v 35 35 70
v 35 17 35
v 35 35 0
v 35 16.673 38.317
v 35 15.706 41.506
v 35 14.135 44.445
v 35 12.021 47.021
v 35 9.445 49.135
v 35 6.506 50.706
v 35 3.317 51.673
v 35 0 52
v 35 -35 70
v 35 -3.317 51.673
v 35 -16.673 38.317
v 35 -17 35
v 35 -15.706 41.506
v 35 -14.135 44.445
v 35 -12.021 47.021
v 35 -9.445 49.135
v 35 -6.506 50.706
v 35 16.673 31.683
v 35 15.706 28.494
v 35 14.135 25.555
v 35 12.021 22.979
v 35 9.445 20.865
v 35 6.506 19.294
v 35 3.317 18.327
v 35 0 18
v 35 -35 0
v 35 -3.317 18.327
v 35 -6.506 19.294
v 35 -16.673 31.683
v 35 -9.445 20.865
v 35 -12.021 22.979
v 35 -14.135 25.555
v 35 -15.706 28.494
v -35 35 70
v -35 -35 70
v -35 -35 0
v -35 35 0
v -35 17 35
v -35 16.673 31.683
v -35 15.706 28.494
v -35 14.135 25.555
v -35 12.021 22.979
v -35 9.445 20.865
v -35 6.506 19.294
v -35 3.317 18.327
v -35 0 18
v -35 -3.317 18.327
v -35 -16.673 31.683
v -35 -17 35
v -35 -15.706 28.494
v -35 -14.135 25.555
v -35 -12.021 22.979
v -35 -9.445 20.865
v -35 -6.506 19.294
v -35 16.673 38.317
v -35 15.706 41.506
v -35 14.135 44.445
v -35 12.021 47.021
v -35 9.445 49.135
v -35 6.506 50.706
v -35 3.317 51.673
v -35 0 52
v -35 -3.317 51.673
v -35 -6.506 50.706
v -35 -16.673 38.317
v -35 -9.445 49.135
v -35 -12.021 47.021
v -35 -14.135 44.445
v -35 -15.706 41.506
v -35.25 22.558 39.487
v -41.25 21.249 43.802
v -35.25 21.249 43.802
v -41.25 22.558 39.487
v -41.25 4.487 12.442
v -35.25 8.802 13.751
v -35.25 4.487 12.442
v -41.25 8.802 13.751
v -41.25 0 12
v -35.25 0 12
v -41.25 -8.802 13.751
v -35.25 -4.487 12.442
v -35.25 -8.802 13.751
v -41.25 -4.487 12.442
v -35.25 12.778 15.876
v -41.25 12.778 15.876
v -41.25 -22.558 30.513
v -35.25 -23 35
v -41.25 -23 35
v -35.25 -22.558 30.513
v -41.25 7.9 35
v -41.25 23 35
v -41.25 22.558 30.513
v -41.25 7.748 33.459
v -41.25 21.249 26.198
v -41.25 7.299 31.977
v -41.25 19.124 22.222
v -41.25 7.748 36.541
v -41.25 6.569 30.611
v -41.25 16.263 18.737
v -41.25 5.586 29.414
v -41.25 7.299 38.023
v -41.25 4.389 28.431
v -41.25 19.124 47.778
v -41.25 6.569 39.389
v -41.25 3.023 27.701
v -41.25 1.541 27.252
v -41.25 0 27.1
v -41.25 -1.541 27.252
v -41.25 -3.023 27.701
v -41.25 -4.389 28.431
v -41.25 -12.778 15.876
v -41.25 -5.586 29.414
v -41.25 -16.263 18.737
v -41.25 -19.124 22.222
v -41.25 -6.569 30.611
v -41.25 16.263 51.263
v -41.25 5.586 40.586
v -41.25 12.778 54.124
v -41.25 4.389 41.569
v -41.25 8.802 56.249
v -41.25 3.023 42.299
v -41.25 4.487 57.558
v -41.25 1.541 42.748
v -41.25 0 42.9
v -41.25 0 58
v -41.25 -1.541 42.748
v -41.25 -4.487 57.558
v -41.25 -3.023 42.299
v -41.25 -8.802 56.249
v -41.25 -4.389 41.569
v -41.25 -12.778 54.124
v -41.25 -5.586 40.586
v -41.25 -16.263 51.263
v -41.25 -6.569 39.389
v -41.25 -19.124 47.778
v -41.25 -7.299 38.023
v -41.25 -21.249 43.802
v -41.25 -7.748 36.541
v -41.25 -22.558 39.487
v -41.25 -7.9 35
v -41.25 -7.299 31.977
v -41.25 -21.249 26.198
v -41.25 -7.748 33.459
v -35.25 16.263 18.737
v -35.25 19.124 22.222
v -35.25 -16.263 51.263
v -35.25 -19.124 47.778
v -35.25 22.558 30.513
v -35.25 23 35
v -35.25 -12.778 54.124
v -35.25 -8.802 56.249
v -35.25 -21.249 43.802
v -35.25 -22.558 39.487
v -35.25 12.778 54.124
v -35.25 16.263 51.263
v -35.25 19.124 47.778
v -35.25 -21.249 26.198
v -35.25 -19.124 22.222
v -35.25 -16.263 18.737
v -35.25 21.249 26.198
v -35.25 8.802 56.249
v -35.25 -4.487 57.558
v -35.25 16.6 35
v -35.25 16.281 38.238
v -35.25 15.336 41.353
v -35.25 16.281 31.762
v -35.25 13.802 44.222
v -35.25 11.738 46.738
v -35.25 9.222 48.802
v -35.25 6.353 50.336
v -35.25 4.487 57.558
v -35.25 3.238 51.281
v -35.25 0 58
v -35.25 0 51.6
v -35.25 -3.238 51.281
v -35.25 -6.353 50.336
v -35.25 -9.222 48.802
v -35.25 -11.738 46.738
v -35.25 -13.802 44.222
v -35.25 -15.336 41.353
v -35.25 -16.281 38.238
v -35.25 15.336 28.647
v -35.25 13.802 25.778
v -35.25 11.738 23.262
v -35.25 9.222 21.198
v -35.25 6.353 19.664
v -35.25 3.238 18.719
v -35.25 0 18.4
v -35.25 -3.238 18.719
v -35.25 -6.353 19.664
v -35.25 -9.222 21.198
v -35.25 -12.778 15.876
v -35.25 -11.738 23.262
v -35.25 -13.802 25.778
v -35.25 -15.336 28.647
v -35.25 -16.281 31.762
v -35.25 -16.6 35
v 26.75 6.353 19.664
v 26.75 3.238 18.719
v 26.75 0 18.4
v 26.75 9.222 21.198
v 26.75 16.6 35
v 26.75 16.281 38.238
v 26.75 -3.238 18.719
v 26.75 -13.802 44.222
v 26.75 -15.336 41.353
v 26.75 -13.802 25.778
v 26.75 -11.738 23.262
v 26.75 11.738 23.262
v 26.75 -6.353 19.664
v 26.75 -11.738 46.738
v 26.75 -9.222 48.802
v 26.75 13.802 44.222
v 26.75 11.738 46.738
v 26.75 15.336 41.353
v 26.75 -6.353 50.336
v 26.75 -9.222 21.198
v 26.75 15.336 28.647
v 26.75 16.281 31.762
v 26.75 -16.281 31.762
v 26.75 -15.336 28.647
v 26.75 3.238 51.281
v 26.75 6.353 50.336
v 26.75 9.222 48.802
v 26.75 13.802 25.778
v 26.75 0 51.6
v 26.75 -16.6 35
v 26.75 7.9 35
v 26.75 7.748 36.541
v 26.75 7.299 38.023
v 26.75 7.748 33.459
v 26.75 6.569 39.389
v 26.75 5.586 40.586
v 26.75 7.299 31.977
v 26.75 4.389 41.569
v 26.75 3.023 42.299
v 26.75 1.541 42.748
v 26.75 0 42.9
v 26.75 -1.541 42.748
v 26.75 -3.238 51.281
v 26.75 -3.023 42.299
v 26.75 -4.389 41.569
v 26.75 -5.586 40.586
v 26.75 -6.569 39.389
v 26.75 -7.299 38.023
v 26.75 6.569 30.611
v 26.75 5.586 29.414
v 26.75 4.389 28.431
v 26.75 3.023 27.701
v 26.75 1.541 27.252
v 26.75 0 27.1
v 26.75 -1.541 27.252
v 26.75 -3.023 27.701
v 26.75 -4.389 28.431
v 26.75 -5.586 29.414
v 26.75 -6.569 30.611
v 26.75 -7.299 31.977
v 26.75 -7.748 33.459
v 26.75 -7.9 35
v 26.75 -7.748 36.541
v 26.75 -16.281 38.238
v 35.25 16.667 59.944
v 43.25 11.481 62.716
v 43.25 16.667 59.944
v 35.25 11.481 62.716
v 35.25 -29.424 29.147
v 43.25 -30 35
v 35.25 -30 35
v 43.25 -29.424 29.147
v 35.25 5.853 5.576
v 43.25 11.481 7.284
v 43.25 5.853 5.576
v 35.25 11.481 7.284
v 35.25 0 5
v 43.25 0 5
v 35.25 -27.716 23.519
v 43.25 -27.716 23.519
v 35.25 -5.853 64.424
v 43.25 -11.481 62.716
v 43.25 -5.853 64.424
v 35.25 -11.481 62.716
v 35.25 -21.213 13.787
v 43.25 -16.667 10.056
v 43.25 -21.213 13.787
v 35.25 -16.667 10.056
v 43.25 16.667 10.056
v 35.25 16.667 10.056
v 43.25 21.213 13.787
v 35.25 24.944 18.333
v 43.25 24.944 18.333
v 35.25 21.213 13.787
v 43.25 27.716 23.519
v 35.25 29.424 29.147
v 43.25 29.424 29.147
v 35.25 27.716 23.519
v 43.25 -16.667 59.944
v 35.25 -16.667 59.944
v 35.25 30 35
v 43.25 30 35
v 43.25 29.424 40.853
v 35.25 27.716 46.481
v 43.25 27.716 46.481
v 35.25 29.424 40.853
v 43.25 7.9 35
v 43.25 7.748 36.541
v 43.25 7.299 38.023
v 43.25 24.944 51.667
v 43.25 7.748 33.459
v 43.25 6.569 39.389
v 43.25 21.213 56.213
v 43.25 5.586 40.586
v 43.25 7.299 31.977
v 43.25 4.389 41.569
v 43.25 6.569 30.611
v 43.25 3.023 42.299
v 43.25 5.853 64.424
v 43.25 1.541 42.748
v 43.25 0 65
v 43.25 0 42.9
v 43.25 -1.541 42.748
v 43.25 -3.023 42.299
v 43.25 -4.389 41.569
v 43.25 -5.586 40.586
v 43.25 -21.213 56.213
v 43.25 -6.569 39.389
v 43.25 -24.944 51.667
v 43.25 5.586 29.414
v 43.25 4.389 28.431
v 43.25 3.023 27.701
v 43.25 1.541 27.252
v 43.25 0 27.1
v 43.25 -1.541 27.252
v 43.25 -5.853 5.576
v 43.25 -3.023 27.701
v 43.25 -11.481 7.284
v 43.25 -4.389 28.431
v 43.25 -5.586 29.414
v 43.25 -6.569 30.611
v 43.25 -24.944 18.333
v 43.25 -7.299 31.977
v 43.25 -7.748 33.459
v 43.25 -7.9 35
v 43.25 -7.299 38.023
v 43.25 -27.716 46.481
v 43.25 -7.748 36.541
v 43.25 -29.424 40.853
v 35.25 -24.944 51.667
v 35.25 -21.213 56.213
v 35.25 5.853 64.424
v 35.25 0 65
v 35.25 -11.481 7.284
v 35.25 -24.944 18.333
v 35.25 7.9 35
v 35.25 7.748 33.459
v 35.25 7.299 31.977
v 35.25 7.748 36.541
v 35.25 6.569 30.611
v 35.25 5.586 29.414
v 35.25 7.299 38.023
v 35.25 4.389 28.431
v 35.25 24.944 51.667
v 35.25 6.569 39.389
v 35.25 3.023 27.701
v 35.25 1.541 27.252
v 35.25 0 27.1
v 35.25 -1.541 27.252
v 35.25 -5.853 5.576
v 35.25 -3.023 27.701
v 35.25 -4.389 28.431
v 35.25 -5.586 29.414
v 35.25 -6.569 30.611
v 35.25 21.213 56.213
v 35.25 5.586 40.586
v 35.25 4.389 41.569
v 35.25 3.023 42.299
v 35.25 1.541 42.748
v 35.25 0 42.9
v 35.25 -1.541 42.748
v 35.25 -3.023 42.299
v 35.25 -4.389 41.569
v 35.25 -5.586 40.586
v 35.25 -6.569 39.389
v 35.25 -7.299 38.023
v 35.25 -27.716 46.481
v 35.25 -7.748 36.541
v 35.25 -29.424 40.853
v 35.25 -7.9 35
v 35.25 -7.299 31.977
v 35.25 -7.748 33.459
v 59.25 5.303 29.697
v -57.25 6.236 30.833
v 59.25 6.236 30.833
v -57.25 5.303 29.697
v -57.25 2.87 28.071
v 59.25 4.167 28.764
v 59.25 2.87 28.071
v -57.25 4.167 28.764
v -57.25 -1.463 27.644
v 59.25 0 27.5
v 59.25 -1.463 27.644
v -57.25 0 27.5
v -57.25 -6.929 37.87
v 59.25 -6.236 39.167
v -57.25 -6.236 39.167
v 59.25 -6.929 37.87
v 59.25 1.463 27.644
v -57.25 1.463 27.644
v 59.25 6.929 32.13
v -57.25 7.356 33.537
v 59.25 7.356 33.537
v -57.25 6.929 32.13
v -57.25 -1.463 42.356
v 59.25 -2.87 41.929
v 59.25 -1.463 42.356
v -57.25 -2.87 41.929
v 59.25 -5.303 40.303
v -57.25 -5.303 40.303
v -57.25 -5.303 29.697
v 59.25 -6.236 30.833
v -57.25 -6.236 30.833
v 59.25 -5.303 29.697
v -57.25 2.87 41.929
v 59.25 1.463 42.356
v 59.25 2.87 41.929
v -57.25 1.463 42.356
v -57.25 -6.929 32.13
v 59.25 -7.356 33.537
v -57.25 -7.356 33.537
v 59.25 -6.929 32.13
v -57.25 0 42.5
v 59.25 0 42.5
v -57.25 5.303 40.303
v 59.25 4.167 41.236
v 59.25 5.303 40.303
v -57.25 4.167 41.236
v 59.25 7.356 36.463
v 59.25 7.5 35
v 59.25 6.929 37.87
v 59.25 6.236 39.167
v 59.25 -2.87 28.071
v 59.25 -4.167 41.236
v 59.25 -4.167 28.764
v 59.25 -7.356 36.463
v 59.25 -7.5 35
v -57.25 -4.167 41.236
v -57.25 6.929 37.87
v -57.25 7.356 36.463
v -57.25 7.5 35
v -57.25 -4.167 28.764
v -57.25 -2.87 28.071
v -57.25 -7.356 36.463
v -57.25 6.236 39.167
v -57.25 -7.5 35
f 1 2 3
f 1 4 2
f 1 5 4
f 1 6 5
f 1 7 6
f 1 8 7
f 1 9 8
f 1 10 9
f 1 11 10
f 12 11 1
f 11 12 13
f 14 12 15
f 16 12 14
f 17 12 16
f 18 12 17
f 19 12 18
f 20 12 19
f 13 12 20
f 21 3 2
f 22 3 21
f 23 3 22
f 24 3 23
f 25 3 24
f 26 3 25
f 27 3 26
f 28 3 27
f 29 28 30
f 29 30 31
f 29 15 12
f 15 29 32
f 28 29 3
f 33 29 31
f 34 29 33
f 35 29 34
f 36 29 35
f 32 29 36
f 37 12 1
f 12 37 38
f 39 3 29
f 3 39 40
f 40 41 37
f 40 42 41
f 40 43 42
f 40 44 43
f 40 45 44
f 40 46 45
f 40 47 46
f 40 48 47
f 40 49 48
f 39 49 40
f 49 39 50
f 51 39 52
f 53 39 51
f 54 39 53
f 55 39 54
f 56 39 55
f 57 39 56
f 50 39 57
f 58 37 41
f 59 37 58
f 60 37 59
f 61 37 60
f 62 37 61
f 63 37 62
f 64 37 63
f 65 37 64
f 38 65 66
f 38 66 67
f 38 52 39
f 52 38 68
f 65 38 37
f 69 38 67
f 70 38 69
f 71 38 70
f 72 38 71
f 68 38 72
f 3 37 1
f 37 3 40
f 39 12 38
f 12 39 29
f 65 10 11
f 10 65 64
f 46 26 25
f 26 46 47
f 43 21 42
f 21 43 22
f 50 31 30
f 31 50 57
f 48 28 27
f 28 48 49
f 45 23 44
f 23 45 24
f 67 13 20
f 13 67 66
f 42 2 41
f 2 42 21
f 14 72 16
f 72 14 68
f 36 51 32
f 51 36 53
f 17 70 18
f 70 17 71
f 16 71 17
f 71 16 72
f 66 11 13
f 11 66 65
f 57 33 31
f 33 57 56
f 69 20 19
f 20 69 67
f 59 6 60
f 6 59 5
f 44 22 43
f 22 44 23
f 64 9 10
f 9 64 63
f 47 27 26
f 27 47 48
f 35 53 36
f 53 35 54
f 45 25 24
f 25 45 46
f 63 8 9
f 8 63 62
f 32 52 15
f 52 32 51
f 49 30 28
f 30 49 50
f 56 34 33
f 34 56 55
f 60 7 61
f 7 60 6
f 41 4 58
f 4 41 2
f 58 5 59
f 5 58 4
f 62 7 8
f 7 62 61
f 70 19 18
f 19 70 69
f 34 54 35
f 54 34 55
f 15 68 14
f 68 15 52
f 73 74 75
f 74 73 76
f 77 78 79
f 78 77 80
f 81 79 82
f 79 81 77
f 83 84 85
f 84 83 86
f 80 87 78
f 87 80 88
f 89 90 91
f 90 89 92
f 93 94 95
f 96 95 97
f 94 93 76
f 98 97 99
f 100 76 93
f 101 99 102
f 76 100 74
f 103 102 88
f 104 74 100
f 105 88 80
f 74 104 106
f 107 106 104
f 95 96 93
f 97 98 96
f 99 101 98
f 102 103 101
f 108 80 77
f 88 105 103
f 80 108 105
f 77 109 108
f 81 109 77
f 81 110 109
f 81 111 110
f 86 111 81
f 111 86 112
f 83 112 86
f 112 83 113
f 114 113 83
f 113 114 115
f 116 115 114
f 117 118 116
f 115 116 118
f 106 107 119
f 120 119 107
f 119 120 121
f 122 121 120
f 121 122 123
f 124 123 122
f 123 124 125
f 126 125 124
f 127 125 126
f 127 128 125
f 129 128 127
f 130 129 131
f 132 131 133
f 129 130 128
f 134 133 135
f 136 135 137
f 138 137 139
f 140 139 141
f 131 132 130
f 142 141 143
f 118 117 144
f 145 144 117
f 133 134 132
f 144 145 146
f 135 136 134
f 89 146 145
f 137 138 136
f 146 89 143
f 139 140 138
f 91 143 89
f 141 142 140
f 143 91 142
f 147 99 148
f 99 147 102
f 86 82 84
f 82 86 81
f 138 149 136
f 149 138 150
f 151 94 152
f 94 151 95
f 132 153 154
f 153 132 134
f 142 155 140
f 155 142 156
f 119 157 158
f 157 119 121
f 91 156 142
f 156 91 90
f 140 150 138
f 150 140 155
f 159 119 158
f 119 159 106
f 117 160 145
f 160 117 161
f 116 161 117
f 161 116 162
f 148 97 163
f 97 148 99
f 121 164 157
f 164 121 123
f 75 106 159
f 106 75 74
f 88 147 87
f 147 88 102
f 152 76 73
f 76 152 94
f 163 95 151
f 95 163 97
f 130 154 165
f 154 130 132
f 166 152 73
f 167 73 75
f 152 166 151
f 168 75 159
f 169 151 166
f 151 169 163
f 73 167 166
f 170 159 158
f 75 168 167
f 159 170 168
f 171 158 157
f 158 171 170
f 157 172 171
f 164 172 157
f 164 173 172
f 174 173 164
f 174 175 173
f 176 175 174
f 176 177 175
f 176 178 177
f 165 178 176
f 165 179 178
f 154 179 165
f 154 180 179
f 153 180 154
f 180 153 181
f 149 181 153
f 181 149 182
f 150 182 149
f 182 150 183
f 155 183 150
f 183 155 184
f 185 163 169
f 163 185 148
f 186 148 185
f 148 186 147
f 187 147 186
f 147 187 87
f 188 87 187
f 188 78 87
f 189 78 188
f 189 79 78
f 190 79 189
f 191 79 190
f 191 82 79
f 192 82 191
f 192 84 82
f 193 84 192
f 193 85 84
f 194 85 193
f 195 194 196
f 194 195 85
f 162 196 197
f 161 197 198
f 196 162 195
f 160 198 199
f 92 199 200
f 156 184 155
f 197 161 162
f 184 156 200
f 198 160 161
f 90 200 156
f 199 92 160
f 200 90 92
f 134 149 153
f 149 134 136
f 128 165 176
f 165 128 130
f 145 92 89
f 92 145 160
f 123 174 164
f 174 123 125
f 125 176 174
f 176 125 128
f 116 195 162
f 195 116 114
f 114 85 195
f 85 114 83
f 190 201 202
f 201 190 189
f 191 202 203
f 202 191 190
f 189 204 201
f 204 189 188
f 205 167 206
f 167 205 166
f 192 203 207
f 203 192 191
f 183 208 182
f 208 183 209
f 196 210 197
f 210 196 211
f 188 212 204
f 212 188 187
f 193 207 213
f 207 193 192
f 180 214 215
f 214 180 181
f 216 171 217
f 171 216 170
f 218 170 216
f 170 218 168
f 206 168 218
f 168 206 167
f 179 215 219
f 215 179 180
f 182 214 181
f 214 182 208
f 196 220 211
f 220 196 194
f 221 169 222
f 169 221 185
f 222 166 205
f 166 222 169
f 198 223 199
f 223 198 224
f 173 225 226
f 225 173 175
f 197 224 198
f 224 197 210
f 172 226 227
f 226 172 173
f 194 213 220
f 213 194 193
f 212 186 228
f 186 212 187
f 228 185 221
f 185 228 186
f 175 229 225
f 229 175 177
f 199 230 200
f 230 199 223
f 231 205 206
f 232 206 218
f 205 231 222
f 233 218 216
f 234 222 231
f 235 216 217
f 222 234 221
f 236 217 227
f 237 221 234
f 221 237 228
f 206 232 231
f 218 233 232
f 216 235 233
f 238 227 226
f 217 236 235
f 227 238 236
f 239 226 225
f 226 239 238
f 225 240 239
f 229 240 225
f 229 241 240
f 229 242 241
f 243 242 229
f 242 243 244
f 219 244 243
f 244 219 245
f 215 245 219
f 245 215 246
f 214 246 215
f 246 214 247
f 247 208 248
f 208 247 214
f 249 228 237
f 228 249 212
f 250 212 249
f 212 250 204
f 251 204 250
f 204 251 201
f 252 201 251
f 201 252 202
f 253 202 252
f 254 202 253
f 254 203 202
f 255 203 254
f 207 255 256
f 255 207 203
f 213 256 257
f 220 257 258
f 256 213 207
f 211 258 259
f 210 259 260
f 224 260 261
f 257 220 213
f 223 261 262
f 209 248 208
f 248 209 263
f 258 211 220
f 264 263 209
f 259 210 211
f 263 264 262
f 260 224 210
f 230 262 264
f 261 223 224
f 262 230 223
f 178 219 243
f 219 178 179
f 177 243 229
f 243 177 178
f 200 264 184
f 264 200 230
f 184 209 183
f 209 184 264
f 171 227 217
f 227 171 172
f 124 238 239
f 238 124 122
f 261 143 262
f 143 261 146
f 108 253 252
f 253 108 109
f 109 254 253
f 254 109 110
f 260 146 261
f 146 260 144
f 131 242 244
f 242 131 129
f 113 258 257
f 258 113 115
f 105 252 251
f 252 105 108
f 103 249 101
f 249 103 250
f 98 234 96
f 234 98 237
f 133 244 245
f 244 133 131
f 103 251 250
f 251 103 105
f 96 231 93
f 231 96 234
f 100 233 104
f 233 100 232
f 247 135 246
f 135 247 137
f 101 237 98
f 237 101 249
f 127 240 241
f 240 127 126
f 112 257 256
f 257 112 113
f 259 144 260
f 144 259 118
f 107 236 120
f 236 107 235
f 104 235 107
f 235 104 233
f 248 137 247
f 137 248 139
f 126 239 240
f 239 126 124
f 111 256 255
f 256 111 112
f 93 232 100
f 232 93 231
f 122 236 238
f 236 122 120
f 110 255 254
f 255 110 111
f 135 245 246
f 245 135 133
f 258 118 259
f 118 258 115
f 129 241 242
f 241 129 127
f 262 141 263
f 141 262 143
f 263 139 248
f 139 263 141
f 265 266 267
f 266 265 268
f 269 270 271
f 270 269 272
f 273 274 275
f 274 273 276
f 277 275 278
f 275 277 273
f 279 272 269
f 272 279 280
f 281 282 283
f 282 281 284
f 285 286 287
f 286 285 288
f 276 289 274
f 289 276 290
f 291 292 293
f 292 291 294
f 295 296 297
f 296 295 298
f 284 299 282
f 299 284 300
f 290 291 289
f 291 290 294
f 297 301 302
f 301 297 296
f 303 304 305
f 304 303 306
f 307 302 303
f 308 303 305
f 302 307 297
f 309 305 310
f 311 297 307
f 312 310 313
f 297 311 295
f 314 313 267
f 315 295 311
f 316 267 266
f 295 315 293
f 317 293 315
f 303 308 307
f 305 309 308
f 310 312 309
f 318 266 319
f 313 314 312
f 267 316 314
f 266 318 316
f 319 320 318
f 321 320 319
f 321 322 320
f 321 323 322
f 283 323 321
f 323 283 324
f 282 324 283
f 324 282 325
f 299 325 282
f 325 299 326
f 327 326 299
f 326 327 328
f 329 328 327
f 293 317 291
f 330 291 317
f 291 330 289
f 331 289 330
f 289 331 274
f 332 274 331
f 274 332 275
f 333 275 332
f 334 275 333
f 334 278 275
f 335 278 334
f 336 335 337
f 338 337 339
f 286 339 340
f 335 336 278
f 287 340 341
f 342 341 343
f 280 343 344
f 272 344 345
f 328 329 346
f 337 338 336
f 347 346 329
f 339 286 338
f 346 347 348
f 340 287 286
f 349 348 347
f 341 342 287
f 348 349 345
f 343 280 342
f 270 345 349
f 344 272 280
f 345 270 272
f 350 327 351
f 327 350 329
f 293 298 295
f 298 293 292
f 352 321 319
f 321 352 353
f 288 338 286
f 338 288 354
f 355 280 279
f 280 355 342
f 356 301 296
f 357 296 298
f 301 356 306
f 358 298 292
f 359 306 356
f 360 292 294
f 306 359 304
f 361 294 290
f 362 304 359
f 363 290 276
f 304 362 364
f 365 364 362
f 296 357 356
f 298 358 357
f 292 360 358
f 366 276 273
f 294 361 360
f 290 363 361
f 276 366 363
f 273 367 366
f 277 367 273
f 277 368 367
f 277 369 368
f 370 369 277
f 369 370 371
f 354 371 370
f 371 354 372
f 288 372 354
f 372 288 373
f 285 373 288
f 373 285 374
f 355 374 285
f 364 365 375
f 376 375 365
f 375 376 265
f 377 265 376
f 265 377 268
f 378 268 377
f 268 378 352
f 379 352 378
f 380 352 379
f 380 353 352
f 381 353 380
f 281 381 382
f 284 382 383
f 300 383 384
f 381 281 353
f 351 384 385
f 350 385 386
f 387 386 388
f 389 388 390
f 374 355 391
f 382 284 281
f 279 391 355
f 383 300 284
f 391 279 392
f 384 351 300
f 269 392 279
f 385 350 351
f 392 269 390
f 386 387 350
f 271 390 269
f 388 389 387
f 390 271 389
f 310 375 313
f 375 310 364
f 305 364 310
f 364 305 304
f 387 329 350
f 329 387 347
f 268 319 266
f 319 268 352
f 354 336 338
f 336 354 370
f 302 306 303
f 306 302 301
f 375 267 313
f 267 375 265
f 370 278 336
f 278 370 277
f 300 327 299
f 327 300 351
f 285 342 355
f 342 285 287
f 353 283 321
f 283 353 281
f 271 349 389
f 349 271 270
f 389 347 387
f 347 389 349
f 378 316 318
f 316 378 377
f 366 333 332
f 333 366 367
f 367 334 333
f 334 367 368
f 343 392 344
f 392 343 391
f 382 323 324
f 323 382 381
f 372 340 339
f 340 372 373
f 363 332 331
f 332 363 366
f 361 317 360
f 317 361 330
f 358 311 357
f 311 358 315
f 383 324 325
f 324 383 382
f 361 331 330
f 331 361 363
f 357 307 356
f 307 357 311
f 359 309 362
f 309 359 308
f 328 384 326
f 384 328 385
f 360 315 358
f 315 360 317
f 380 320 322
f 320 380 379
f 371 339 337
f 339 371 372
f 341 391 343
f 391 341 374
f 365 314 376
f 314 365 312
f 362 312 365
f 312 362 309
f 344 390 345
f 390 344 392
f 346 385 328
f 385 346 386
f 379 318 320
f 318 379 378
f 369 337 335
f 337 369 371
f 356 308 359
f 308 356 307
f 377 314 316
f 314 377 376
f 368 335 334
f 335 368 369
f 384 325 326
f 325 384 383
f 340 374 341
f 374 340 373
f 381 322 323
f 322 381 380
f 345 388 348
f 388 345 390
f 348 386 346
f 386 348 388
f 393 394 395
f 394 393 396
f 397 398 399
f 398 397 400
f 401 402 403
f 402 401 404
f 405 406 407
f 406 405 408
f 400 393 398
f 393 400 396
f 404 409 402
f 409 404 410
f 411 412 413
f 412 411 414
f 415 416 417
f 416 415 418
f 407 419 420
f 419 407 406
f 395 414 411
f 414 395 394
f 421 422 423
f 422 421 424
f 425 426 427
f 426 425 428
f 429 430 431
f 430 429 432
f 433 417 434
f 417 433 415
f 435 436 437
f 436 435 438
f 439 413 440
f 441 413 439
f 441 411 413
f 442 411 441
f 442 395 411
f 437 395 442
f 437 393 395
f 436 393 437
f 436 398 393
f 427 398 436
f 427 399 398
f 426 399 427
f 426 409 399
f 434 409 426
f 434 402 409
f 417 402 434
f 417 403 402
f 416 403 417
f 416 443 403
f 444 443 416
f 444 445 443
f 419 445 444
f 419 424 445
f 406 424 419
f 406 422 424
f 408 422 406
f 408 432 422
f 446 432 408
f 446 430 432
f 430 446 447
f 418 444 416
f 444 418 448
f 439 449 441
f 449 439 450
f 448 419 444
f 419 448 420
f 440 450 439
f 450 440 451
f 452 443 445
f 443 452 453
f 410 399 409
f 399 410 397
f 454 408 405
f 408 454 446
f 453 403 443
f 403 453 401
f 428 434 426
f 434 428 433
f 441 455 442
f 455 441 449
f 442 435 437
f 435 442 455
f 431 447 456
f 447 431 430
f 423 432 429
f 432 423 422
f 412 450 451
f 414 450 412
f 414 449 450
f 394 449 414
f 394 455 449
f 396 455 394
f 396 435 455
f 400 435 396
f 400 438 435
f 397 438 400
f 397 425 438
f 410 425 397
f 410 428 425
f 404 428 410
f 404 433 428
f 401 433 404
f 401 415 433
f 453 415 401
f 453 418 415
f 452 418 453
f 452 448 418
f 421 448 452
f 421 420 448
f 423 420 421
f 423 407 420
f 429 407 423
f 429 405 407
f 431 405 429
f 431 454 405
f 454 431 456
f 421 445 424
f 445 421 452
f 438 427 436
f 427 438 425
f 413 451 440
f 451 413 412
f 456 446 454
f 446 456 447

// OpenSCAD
$fn = 32;

// ------------------------------------------------------------------------
// Bushed housing: 70 x 70 x 70 mm housing, bushing d33.2
// Every part is its own module, assembly() places them once.
// ------------------------------------------------------------------------

// --- part 1 ---
module housing() {
  difference() {
    translate([-35, -35, 0]) cube([70, 70, 70]);
    translate([0, 0, 35]) rotate([0, 90, 0]) cylinder(h = 72, d = 34, center = true);
  }
}

// --- part 2 ---
module bushing() {
  difference() {
    union() {
      cylinder(h = 6, d = 46);
      translate([0, 0, 6]) cylinder(h = 62, d = 33.2);
    }
    translate([0, 0, -1]) cylinder(h = 70, d = 15.8);
  }
}

// --- part 3 ---
module shaft() {
  translate([0, 0, -58.25]) cylinder(h = 116.5, d = 15);
}

// --- part 4 ---
module cover() {
  difference() {
    cylinder(h = 8, d = 60);
    translate([0, 0, -1]) cylinder(h = 10, d = 15.8);
  }
}

// --- assembly ---
module assembly() {
  translate([0, 0, 0]) rotate([0, 0, 0]) housing();
  translate([-41.25, 0, 35]) rotate([0, 90, 0]) bushing();
  translate([1, 0, 35]) rotate([0, 90, 0]) shaft();
  translate([35.25, 0, 35]) rotate([0, 90, 0]) cover();
}

assembly();
